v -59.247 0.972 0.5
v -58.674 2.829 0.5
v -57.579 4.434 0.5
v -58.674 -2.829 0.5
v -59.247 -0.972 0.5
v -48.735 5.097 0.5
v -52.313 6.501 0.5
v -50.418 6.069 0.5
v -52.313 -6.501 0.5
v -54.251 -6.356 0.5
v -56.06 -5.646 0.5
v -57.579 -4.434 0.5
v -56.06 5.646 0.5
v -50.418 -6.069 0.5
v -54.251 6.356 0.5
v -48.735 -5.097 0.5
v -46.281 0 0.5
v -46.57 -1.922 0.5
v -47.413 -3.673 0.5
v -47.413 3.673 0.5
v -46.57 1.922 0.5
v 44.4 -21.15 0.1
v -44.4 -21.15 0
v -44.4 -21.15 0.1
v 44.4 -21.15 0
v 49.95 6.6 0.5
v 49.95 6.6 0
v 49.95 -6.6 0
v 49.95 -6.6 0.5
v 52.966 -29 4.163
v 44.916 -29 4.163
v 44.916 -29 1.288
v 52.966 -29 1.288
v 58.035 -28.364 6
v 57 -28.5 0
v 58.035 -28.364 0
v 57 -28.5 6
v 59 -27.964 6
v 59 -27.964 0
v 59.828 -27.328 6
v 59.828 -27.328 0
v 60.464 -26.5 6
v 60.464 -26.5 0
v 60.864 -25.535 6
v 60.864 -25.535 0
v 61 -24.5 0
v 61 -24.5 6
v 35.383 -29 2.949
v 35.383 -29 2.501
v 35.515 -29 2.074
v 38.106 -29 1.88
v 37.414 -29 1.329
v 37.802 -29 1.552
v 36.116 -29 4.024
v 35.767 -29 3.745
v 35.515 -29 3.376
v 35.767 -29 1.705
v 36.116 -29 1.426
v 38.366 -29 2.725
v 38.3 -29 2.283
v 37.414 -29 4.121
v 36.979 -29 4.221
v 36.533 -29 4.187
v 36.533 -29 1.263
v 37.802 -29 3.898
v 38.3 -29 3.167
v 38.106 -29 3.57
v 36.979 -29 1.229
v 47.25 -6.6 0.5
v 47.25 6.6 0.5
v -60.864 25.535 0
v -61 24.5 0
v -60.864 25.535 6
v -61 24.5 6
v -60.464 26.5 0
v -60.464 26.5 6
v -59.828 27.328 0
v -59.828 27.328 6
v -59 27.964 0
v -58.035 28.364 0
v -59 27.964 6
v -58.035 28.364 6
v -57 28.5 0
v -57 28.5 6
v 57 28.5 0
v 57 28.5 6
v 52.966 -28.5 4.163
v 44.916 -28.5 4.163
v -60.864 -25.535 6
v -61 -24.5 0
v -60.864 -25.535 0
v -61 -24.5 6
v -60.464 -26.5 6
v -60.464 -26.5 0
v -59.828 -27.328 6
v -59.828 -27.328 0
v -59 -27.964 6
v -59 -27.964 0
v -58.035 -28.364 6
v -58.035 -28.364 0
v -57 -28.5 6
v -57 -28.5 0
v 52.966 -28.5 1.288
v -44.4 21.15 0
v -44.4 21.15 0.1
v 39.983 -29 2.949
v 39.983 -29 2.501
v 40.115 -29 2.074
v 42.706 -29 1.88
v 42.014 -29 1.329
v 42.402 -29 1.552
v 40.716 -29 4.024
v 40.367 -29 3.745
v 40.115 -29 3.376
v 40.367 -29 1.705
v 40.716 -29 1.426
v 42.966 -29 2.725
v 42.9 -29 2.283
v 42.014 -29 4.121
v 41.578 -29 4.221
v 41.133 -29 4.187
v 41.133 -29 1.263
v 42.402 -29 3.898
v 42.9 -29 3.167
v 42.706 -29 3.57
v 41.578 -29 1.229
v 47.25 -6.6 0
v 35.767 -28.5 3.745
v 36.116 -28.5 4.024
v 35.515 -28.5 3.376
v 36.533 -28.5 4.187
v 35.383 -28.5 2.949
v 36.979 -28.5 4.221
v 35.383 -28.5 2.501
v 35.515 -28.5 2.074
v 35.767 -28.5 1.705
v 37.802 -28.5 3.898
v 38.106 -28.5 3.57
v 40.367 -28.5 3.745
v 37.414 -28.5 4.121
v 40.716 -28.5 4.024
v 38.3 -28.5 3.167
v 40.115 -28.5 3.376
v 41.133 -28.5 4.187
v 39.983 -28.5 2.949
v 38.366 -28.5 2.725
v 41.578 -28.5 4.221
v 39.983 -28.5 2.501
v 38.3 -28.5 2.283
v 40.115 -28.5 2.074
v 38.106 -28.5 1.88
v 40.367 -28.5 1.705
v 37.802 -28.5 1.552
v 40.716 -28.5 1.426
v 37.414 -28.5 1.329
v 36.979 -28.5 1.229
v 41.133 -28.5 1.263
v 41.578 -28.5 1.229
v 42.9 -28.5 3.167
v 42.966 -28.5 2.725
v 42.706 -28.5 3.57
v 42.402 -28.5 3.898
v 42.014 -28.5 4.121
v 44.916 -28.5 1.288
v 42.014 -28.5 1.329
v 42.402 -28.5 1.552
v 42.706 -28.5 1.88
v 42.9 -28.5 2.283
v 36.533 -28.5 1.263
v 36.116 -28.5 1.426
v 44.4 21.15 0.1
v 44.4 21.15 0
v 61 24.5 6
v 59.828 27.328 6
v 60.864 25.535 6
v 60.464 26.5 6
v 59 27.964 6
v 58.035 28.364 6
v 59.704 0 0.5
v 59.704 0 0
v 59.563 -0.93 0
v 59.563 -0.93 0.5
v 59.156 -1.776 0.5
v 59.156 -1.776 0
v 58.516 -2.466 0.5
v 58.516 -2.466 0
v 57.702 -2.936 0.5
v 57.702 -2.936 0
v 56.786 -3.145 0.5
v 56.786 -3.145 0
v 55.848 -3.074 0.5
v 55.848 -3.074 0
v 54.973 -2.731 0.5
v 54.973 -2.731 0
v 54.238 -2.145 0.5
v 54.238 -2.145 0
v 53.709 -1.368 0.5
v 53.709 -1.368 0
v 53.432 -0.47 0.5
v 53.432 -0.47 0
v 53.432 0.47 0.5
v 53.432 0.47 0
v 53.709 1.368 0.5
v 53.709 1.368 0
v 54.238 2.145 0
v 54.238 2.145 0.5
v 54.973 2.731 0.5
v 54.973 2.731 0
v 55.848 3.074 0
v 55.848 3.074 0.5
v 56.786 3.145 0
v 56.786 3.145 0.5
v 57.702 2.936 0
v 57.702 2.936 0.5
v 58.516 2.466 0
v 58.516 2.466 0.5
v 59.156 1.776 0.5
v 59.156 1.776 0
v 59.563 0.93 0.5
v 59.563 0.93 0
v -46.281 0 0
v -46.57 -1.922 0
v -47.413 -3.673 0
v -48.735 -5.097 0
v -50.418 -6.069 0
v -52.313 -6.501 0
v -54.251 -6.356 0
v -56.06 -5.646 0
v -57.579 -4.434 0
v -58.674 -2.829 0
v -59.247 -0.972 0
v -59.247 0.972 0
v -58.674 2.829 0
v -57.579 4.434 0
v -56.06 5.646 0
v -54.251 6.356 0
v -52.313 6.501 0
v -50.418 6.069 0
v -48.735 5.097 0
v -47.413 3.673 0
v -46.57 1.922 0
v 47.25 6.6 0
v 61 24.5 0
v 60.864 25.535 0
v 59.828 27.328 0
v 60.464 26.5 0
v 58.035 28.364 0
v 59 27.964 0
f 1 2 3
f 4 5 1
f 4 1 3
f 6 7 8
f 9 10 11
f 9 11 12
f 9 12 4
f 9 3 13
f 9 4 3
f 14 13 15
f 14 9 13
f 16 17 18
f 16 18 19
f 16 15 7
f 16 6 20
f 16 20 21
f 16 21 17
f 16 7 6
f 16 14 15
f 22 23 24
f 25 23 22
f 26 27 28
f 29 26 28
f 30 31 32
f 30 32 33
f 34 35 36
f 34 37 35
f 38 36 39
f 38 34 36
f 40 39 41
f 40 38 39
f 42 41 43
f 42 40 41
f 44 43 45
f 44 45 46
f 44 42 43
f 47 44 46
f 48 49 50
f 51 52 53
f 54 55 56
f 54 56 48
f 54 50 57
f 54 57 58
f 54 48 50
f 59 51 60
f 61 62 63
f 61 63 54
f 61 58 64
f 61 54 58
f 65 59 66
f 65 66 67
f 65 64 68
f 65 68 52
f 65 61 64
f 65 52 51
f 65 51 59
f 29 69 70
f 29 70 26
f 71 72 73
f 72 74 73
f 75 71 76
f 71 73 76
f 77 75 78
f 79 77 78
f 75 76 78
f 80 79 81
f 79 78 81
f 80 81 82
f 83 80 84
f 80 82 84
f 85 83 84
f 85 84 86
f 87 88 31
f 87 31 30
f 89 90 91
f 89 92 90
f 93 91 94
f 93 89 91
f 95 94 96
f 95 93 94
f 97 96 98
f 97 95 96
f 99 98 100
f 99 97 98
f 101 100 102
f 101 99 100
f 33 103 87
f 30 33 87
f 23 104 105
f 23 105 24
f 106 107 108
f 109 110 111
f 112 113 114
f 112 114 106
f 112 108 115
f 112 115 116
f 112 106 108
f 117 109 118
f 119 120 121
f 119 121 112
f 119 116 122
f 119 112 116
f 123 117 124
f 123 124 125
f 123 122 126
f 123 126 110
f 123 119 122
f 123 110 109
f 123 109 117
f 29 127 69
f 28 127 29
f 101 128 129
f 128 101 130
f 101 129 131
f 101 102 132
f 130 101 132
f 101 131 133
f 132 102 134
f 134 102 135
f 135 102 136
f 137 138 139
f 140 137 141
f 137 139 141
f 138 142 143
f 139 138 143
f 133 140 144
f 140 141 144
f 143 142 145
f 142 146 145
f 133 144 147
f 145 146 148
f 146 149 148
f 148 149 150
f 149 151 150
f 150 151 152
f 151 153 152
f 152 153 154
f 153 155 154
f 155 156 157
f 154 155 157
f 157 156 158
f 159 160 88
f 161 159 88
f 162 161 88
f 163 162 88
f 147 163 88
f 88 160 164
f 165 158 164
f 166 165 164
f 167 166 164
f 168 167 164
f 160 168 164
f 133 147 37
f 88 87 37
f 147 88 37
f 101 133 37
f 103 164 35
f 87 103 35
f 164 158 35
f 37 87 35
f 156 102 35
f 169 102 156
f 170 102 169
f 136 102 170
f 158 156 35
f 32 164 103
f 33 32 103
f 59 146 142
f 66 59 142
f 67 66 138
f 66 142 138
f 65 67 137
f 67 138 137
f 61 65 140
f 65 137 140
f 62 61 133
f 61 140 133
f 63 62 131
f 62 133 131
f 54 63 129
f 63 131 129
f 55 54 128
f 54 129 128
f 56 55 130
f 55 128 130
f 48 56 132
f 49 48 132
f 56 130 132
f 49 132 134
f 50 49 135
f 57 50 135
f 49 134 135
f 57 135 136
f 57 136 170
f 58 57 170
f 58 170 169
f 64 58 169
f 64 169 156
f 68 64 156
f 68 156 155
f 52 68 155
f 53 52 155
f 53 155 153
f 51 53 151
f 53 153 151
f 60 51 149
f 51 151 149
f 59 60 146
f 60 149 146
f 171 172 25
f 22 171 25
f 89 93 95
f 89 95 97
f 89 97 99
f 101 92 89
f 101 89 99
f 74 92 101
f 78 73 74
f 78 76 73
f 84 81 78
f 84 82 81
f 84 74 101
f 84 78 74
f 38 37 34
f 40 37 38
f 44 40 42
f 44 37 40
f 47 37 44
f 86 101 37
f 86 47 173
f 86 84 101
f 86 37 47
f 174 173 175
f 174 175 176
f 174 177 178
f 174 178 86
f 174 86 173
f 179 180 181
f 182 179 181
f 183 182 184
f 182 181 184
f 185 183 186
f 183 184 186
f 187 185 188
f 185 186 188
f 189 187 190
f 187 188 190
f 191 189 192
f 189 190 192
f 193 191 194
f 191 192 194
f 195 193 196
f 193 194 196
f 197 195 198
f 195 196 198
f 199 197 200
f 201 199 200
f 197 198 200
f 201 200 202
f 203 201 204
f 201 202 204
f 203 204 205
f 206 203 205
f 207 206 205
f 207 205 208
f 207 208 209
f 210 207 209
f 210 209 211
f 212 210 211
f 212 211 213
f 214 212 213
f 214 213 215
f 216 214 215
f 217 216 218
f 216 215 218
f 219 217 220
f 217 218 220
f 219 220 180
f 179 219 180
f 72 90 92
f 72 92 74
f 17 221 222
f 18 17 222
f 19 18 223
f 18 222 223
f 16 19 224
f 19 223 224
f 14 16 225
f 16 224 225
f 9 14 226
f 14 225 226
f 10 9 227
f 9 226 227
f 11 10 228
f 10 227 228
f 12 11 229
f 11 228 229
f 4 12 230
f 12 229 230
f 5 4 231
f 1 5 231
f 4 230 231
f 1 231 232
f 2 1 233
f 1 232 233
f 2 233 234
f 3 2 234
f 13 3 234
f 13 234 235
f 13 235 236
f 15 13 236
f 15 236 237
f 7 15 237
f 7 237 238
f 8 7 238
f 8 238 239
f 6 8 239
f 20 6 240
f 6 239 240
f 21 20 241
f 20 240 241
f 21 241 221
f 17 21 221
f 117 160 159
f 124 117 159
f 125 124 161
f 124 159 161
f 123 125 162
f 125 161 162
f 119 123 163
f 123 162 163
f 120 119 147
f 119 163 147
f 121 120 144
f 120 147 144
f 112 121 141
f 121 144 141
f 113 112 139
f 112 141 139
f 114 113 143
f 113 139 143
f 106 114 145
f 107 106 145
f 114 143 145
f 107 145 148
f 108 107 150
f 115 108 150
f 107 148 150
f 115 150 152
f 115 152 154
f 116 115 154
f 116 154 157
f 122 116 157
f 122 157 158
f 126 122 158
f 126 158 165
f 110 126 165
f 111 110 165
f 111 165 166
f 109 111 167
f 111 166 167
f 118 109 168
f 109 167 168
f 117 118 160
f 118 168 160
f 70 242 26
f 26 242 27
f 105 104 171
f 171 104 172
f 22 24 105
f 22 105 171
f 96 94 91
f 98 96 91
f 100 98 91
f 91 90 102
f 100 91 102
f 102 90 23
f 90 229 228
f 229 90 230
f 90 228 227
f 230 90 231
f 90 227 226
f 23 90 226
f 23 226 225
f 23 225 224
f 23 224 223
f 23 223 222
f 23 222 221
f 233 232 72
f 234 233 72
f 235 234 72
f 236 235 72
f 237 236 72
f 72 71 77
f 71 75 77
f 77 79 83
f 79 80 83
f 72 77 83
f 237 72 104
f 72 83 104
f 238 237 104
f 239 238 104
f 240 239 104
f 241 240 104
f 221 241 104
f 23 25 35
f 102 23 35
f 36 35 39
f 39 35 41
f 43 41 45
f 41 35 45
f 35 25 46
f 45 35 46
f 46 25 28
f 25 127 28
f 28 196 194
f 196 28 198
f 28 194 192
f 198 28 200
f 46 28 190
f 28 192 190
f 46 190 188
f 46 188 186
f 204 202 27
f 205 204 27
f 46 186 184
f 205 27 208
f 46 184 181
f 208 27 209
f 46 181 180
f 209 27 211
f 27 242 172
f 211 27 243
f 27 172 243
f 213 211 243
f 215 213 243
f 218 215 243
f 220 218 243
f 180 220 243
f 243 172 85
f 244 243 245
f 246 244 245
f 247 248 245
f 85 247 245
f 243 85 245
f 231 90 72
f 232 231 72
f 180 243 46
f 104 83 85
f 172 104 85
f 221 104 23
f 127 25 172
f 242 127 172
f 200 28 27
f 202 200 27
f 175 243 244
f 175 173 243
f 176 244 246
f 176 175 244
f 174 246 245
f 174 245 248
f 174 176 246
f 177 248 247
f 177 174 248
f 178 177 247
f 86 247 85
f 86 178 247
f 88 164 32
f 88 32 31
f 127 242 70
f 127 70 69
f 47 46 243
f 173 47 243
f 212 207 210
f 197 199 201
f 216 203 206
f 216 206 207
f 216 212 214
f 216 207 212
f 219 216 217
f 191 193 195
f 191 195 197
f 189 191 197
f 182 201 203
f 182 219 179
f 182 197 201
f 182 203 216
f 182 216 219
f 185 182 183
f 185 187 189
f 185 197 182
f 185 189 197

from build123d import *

# Parameters (mm, degrees)
F0_W      = 122
F0_H      = 57
F1_DEPTH  = 6
F2_R      = 4
F3_R      = 1.5
F3_W      = 8.049835
F3_H      = 2.874941
F4_DEPTH  = 0.5
F5_R      = 6.519395
F6_DEPTH  = 0.5
F7_W      = 88.799998
F7_H      = 42.300004
F8_DEPTH  = 0.1
F9_R      = 3.153566
F9_W      = 2.700009
F9_H      = 13.199998
F10_DEPTH = 0.5


with BuildPart() as f1:
    # F0 (on Top) → F1 (new body)
    with BuildSketch(Plane.XY):
        Rectangle(F0_W, F0_H)
    extrude(amount=F1_DEPTH)

    # F2
    f2_edges = [f1.edges().sort_by_distance(p)[0] for p in [
        (61, 28.5, 3),
        (61, -28.5, 3),
        (-61, 28.5, 3),
        (-61, -28.5, 3),
    ]]
    fillet(f2_edges, radius=F2_R)

    # F3 (on face) → F4 (join)
    with BuildSketch(Plane.XZ.offset(28.5)):
        with Locations((36.866432, 2.725052)):
            Circle(F3_R)
        with Locations((41.46634, 2.725052)):
            Circle(F3_R)
        with Locations((48.941184, 2.725053)):
            Rectangle(F3_W, F3_H)
    extrude(amount=F4_DEPTH)

    # F5 (on face) → F6 (cut)
    with BuildSketch(Plane(origin=(0, 0, 0), x_dir=(1, 0, 0), z_dir=(0, 0, -1))):
        with Locations((-52.800003, 0)):
            Circle(F5_R)
    extrude(amount=-F6_DEPTH, mode=Mode.SUBTRACT)

    # F7 (on face) → F8 (cut)
    with BuildSketch(Plane(origin=(0, 0, 0), x_dir=(1, 0, 0), z_dir=(0, 0, -1))):
        Rectangle(F7_W, F7_H)
    extrude(amount=-F8_DEPTH, mode=Mode.SUBTRACT)

    # F9 (on face) → F10 (cut)
    with BuildSketch(Plane(origin=(0, 0, 0), x_dir=(1, 0, 0), z_dir=(0, 0, -1))):
        with Locations((56.55, 0)):
            Circle(F9_R)
        with Locations((48.599999, 0)):
            Rectangle(F9_W, F9_H)
    extrude(amount=-F10_DEPTH, mode=Mode.SUBTRACT)


solid = f1.part
